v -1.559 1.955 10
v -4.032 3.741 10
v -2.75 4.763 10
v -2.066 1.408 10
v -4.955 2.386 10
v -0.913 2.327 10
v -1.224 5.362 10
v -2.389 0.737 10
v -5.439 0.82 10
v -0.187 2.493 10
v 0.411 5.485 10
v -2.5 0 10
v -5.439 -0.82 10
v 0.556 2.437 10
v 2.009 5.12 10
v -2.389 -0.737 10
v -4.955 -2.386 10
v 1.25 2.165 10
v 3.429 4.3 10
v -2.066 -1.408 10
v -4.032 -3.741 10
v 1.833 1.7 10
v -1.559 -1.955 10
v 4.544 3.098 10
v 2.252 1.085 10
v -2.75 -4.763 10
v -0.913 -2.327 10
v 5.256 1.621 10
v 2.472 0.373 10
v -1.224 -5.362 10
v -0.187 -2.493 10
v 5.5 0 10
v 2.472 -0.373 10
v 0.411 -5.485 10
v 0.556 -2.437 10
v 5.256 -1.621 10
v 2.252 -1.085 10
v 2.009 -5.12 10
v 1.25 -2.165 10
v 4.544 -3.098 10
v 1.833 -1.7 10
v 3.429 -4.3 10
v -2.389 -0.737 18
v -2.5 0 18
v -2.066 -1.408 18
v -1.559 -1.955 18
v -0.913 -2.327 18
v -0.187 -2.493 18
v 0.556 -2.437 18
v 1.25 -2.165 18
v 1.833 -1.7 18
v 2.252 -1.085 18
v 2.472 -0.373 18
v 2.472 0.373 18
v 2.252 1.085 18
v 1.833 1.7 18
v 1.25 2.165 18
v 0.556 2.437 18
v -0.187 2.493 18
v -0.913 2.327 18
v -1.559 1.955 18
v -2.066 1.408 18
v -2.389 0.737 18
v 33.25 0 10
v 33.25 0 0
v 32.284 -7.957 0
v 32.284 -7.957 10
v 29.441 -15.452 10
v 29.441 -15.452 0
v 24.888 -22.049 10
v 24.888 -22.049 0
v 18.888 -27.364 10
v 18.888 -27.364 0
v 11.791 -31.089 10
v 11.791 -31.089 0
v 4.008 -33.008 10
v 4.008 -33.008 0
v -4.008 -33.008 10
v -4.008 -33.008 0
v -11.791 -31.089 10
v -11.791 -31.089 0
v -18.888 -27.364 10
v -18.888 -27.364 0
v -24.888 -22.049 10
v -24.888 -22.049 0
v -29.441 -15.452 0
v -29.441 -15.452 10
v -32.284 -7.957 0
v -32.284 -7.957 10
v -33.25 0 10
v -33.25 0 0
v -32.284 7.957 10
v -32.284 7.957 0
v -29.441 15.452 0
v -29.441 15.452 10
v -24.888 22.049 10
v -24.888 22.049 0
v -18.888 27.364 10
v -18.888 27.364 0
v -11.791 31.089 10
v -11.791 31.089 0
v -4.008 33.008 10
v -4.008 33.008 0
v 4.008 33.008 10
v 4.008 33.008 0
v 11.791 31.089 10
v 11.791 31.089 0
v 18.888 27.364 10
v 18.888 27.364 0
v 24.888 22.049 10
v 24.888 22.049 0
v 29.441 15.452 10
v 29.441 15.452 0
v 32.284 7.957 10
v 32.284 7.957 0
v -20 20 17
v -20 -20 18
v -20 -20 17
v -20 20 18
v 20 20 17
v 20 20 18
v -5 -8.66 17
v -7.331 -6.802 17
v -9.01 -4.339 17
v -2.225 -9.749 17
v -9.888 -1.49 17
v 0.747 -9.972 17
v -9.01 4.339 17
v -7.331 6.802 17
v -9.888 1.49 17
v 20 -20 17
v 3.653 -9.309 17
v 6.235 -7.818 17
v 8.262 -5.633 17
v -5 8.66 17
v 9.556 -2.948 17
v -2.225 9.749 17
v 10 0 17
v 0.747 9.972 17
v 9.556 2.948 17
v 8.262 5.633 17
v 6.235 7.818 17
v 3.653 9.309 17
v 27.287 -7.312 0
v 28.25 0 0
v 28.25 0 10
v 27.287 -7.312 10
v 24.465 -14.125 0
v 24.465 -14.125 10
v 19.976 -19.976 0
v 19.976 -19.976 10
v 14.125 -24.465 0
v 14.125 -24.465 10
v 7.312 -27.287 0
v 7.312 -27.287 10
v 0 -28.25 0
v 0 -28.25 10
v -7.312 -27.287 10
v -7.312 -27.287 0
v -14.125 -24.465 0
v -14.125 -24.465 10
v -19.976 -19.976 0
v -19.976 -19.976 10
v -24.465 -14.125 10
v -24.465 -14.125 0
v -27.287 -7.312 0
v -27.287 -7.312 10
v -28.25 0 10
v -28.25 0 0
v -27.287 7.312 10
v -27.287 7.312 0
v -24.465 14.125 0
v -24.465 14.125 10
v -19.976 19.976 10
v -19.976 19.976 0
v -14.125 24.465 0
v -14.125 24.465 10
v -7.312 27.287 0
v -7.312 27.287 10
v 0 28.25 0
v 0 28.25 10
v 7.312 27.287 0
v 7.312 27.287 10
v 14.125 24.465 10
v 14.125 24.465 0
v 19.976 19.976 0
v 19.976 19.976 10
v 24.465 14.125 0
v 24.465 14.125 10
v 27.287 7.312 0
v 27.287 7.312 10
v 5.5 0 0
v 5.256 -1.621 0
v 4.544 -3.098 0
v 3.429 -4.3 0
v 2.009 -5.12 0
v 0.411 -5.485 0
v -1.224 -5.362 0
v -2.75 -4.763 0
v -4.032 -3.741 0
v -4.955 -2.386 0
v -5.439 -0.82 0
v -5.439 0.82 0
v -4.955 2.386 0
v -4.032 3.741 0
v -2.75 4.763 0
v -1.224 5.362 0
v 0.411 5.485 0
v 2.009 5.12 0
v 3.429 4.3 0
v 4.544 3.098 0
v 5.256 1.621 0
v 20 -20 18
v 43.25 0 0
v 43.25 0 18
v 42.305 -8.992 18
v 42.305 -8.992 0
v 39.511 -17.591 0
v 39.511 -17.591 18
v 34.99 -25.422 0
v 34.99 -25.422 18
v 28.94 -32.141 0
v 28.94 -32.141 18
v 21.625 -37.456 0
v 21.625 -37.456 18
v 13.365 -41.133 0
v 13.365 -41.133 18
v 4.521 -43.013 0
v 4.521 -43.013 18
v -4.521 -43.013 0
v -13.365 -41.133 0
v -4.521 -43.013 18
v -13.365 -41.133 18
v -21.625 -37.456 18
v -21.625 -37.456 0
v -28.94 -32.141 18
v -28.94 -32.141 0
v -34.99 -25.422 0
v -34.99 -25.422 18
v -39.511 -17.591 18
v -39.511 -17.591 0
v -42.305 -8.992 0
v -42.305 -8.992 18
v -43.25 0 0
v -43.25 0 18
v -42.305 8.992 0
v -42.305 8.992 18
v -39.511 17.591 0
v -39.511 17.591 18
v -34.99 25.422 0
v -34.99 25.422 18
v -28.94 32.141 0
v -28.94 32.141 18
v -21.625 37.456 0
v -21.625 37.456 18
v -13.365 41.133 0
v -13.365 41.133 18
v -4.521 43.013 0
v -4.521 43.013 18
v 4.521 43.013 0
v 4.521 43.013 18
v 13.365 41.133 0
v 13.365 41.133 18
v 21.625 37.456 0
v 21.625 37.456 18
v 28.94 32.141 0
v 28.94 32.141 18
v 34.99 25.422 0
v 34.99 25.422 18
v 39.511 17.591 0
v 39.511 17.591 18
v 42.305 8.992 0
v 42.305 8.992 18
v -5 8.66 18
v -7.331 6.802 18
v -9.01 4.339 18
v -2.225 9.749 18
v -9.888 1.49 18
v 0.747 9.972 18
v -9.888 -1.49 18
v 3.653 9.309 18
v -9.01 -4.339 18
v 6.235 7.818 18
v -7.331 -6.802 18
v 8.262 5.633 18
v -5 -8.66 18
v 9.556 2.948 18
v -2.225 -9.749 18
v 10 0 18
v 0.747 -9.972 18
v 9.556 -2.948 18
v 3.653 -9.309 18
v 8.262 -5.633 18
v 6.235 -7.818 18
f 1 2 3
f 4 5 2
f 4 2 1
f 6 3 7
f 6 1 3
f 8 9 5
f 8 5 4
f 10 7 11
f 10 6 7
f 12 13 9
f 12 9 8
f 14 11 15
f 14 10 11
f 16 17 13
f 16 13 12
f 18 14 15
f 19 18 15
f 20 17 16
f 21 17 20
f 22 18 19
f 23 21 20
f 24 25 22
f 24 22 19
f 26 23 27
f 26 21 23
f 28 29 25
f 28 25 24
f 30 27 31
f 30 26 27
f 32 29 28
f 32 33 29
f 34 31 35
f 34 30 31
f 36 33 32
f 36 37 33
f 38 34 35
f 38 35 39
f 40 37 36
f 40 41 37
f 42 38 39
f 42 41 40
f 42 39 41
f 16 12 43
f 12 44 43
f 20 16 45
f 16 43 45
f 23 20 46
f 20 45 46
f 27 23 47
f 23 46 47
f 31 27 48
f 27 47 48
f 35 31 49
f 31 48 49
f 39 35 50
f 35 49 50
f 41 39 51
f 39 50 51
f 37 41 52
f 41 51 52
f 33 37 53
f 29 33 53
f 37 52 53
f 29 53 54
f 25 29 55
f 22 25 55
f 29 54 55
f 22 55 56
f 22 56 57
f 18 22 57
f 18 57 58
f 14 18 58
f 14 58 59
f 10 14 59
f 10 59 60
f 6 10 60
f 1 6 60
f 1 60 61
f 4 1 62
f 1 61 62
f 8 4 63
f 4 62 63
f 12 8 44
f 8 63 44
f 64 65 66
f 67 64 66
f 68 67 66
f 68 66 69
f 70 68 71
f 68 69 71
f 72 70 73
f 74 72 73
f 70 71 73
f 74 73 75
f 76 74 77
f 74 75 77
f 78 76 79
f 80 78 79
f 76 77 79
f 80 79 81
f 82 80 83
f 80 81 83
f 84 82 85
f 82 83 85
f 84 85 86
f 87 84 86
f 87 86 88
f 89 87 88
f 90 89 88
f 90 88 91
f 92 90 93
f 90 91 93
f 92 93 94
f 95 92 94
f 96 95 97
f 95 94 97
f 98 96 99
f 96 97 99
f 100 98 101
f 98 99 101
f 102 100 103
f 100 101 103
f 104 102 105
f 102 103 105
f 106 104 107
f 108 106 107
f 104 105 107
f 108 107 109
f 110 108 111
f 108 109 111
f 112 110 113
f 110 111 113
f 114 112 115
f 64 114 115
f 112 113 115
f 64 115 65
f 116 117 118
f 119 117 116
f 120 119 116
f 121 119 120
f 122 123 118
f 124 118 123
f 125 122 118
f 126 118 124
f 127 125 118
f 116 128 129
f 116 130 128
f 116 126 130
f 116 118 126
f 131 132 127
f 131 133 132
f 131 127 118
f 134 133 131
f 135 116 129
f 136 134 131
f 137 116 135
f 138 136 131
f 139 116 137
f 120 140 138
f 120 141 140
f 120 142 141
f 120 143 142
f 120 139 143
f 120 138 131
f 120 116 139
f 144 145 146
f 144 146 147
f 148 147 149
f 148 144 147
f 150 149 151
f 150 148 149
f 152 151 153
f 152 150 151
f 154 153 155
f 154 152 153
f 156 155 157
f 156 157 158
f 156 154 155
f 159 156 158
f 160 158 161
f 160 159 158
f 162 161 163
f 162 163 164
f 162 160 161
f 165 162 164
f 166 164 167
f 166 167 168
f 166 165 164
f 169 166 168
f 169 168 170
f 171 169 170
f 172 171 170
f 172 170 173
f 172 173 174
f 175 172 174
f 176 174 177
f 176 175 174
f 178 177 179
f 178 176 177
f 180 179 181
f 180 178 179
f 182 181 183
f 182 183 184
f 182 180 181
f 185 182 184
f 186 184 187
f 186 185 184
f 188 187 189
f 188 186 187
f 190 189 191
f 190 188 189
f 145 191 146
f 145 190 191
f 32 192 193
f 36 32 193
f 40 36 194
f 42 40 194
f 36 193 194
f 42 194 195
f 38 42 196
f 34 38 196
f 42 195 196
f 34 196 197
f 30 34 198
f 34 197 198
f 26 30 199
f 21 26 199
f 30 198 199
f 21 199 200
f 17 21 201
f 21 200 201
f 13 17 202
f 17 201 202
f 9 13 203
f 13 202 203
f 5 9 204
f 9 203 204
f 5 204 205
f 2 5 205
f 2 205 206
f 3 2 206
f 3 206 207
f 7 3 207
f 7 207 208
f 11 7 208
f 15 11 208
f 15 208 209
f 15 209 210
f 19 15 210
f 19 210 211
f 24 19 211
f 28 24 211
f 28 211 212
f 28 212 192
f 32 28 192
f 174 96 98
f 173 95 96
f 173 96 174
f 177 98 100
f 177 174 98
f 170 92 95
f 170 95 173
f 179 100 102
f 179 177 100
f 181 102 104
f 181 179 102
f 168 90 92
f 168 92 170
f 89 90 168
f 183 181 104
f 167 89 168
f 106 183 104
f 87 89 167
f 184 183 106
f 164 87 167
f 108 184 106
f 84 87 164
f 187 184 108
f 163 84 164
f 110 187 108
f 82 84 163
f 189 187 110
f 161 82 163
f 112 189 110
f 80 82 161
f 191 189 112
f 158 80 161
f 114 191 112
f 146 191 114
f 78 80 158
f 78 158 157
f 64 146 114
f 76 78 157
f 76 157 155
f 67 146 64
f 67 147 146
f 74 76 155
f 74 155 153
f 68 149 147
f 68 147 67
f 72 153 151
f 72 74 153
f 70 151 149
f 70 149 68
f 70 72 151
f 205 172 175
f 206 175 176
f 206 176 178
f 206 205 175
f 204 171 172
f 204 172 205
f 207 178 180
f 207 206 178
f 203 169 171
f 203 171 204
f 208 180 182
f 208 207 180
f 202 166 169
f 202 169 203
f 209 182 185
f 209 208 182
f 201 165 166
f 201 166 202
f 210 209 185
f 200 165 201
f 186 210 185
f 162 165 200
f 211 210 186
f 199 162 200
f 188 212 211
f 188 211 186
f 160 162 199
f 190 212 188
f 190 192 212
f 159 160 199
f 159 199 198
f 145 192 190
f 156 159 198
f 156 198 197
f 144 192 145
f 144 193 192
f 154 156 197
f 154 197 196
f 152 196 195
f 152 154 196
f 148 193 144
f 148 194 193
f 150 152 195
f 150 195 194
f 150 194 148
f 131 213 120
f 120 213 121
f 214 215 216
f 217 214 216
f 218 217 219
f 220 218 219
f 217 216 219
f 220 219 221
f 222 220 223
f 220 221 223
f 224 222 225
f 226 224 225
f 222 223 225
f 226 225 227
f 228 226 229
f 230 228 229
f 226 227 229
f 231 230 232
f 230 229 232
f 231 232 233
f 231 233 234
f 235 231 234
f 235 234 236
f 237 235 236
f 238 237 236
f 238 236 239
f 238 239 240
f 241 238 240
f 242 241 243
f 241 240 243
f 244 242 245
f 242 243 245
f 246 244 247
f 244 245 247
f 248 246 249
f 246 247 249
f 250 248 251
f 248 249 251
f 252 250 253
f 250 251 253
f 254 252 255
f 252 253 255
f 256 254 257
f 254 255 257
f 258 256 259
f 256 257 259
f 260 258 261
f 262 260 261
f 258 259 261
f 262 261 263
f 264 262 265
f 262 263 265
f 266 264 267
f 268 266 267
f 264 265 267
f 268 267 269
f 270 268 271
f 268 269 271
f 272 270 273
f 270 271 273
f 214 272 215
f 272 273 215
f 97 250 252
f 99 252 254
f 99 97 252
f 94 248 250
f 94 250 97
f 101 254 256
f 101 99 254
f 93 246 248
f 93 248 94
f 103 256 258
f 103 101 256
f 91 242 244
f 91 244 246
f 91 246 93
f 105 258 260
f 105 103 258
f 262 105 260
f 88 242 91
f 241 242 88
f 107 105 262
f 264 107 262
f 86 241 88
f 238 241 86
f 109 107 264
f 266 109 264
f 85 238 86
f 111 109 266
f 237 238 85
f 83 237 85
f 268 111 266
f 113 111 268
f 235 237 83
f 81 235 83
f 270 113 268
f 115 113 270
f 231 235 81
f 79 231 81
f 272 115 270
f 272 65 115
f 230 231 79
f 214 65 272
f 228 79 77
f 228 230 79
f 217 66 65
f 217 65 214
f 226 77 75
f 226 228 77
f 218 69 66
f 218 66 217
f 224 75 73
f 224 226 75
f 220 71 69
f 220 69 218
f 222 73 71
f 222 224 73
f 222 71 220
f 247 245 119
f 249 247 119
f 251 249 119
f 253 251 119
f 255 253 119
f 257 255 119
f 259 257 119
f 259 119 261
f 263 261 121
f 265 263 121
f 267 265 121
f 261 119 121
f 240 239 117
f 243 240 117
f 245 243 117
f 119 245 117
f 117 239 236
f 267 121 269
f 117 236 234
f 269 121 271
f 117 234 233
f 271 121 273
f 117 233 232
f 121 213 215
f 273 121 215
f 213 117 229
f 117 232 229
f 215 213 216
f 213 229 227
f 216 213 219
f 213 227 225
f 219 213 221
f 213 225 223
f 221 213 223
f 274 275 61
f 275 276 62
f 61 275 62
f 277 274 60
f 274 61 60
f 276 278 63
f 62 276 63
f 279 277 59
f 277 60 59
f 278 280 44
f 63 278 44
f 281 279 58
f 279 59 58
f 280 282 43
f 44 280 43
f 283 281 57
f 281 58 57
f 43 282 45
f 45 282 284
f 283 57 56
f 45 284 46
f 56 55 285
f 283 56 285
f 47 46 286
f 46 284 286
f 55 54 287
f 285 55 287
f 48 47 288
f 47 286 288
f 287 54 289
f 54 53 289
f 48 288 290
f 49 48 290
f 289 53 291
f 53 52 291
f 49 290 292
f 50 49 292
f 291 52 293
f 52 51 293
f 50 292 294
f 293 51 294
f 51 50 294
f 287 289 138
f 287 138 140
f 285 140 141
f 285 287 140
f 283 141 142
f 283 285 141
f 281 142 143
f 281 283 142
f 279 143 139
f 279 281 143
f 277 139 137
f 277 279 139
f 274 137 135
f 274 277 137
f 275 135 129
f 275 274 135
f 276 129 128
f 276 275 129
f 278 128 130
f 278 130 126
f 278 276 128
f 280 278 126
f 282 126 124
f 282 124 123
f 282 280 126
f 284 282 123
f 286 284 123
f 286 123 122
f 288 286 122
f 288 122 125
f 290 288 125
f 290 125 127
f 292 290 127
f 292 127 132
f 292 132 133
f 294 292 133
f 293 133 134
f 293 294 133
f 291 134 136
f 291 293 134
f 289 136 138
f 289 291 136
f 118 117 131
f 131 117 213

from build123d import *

# Parameters (mm, degrees)
SKETCH005_R              = 43.25
PAD002_DEPTH             = 18
SKETCH006_R              = 33.25
SKETCH006_R_2            = 28.25
POCKET003_DEPTH          = 10
HOLE_D                   = 5
HOLE_CBORE_D             = 11
HOLE_CBORE_DEPTH         = 10
SKETCH008_W              = 40
SKETCH008_H              = 40
SKETCH008_R              = 10
POCKET004_DEPTH          = 1
CLONE003_PLACEMENT_ANGLE = 180


with BuildPart() as part:
    # Sketch005 → Pad002 (new body)
    with BuildSketch(Plane.XY):
        Circle(SKETCH005_R)
    extrude(amount=PAD002_DEPTH)

    # Sketch006 (on Face3 of Pad002) → Pocket003 (cut)
    with BuildSketch(Plane.XY.offset(18)):
        Circle(SKETCH006_R)
        Circle(SKETCH006_R_2, mode=Mode.SUBTRACT)
    extrude(amount=-POCKET003_DEPTH, mode=Mode.SUBTRACT)

    # Hole (through all)
    with Locations(Plane.XY.offset(18)):
        with Locations((0, 0)):
            CounterBoreHole(HOLE_D / 2, HOLE_CBORE_D / 2, HOLE_CBORE_DEPTH)

    # Sketch008 (on Face2 of Hole) → Pocket004 (cut)
    with BuildSketch(Plane(origin=(0, 0, 0), x_dir=(1, 0, 0), z_dir=(0, 0, -1))):
        Rectangle(SKETCH008_W, SKETCH008_H)
        Circle(SKETCH008_R, mode=Mode.SUBTRACT)
    extrude(amount=-POCKET004_DEPTH, mode=Mode.SUBTRACT)


with BuildPart() as part_1:
    # Clone003 placement: moved
    add(part.part.moved(Location((0, 0, 18))).rotate(Axis((0, 0, 18), (1, 0, 0)), CLONE003_PLACEMENT_ANGLE))


solid = part_1.part
